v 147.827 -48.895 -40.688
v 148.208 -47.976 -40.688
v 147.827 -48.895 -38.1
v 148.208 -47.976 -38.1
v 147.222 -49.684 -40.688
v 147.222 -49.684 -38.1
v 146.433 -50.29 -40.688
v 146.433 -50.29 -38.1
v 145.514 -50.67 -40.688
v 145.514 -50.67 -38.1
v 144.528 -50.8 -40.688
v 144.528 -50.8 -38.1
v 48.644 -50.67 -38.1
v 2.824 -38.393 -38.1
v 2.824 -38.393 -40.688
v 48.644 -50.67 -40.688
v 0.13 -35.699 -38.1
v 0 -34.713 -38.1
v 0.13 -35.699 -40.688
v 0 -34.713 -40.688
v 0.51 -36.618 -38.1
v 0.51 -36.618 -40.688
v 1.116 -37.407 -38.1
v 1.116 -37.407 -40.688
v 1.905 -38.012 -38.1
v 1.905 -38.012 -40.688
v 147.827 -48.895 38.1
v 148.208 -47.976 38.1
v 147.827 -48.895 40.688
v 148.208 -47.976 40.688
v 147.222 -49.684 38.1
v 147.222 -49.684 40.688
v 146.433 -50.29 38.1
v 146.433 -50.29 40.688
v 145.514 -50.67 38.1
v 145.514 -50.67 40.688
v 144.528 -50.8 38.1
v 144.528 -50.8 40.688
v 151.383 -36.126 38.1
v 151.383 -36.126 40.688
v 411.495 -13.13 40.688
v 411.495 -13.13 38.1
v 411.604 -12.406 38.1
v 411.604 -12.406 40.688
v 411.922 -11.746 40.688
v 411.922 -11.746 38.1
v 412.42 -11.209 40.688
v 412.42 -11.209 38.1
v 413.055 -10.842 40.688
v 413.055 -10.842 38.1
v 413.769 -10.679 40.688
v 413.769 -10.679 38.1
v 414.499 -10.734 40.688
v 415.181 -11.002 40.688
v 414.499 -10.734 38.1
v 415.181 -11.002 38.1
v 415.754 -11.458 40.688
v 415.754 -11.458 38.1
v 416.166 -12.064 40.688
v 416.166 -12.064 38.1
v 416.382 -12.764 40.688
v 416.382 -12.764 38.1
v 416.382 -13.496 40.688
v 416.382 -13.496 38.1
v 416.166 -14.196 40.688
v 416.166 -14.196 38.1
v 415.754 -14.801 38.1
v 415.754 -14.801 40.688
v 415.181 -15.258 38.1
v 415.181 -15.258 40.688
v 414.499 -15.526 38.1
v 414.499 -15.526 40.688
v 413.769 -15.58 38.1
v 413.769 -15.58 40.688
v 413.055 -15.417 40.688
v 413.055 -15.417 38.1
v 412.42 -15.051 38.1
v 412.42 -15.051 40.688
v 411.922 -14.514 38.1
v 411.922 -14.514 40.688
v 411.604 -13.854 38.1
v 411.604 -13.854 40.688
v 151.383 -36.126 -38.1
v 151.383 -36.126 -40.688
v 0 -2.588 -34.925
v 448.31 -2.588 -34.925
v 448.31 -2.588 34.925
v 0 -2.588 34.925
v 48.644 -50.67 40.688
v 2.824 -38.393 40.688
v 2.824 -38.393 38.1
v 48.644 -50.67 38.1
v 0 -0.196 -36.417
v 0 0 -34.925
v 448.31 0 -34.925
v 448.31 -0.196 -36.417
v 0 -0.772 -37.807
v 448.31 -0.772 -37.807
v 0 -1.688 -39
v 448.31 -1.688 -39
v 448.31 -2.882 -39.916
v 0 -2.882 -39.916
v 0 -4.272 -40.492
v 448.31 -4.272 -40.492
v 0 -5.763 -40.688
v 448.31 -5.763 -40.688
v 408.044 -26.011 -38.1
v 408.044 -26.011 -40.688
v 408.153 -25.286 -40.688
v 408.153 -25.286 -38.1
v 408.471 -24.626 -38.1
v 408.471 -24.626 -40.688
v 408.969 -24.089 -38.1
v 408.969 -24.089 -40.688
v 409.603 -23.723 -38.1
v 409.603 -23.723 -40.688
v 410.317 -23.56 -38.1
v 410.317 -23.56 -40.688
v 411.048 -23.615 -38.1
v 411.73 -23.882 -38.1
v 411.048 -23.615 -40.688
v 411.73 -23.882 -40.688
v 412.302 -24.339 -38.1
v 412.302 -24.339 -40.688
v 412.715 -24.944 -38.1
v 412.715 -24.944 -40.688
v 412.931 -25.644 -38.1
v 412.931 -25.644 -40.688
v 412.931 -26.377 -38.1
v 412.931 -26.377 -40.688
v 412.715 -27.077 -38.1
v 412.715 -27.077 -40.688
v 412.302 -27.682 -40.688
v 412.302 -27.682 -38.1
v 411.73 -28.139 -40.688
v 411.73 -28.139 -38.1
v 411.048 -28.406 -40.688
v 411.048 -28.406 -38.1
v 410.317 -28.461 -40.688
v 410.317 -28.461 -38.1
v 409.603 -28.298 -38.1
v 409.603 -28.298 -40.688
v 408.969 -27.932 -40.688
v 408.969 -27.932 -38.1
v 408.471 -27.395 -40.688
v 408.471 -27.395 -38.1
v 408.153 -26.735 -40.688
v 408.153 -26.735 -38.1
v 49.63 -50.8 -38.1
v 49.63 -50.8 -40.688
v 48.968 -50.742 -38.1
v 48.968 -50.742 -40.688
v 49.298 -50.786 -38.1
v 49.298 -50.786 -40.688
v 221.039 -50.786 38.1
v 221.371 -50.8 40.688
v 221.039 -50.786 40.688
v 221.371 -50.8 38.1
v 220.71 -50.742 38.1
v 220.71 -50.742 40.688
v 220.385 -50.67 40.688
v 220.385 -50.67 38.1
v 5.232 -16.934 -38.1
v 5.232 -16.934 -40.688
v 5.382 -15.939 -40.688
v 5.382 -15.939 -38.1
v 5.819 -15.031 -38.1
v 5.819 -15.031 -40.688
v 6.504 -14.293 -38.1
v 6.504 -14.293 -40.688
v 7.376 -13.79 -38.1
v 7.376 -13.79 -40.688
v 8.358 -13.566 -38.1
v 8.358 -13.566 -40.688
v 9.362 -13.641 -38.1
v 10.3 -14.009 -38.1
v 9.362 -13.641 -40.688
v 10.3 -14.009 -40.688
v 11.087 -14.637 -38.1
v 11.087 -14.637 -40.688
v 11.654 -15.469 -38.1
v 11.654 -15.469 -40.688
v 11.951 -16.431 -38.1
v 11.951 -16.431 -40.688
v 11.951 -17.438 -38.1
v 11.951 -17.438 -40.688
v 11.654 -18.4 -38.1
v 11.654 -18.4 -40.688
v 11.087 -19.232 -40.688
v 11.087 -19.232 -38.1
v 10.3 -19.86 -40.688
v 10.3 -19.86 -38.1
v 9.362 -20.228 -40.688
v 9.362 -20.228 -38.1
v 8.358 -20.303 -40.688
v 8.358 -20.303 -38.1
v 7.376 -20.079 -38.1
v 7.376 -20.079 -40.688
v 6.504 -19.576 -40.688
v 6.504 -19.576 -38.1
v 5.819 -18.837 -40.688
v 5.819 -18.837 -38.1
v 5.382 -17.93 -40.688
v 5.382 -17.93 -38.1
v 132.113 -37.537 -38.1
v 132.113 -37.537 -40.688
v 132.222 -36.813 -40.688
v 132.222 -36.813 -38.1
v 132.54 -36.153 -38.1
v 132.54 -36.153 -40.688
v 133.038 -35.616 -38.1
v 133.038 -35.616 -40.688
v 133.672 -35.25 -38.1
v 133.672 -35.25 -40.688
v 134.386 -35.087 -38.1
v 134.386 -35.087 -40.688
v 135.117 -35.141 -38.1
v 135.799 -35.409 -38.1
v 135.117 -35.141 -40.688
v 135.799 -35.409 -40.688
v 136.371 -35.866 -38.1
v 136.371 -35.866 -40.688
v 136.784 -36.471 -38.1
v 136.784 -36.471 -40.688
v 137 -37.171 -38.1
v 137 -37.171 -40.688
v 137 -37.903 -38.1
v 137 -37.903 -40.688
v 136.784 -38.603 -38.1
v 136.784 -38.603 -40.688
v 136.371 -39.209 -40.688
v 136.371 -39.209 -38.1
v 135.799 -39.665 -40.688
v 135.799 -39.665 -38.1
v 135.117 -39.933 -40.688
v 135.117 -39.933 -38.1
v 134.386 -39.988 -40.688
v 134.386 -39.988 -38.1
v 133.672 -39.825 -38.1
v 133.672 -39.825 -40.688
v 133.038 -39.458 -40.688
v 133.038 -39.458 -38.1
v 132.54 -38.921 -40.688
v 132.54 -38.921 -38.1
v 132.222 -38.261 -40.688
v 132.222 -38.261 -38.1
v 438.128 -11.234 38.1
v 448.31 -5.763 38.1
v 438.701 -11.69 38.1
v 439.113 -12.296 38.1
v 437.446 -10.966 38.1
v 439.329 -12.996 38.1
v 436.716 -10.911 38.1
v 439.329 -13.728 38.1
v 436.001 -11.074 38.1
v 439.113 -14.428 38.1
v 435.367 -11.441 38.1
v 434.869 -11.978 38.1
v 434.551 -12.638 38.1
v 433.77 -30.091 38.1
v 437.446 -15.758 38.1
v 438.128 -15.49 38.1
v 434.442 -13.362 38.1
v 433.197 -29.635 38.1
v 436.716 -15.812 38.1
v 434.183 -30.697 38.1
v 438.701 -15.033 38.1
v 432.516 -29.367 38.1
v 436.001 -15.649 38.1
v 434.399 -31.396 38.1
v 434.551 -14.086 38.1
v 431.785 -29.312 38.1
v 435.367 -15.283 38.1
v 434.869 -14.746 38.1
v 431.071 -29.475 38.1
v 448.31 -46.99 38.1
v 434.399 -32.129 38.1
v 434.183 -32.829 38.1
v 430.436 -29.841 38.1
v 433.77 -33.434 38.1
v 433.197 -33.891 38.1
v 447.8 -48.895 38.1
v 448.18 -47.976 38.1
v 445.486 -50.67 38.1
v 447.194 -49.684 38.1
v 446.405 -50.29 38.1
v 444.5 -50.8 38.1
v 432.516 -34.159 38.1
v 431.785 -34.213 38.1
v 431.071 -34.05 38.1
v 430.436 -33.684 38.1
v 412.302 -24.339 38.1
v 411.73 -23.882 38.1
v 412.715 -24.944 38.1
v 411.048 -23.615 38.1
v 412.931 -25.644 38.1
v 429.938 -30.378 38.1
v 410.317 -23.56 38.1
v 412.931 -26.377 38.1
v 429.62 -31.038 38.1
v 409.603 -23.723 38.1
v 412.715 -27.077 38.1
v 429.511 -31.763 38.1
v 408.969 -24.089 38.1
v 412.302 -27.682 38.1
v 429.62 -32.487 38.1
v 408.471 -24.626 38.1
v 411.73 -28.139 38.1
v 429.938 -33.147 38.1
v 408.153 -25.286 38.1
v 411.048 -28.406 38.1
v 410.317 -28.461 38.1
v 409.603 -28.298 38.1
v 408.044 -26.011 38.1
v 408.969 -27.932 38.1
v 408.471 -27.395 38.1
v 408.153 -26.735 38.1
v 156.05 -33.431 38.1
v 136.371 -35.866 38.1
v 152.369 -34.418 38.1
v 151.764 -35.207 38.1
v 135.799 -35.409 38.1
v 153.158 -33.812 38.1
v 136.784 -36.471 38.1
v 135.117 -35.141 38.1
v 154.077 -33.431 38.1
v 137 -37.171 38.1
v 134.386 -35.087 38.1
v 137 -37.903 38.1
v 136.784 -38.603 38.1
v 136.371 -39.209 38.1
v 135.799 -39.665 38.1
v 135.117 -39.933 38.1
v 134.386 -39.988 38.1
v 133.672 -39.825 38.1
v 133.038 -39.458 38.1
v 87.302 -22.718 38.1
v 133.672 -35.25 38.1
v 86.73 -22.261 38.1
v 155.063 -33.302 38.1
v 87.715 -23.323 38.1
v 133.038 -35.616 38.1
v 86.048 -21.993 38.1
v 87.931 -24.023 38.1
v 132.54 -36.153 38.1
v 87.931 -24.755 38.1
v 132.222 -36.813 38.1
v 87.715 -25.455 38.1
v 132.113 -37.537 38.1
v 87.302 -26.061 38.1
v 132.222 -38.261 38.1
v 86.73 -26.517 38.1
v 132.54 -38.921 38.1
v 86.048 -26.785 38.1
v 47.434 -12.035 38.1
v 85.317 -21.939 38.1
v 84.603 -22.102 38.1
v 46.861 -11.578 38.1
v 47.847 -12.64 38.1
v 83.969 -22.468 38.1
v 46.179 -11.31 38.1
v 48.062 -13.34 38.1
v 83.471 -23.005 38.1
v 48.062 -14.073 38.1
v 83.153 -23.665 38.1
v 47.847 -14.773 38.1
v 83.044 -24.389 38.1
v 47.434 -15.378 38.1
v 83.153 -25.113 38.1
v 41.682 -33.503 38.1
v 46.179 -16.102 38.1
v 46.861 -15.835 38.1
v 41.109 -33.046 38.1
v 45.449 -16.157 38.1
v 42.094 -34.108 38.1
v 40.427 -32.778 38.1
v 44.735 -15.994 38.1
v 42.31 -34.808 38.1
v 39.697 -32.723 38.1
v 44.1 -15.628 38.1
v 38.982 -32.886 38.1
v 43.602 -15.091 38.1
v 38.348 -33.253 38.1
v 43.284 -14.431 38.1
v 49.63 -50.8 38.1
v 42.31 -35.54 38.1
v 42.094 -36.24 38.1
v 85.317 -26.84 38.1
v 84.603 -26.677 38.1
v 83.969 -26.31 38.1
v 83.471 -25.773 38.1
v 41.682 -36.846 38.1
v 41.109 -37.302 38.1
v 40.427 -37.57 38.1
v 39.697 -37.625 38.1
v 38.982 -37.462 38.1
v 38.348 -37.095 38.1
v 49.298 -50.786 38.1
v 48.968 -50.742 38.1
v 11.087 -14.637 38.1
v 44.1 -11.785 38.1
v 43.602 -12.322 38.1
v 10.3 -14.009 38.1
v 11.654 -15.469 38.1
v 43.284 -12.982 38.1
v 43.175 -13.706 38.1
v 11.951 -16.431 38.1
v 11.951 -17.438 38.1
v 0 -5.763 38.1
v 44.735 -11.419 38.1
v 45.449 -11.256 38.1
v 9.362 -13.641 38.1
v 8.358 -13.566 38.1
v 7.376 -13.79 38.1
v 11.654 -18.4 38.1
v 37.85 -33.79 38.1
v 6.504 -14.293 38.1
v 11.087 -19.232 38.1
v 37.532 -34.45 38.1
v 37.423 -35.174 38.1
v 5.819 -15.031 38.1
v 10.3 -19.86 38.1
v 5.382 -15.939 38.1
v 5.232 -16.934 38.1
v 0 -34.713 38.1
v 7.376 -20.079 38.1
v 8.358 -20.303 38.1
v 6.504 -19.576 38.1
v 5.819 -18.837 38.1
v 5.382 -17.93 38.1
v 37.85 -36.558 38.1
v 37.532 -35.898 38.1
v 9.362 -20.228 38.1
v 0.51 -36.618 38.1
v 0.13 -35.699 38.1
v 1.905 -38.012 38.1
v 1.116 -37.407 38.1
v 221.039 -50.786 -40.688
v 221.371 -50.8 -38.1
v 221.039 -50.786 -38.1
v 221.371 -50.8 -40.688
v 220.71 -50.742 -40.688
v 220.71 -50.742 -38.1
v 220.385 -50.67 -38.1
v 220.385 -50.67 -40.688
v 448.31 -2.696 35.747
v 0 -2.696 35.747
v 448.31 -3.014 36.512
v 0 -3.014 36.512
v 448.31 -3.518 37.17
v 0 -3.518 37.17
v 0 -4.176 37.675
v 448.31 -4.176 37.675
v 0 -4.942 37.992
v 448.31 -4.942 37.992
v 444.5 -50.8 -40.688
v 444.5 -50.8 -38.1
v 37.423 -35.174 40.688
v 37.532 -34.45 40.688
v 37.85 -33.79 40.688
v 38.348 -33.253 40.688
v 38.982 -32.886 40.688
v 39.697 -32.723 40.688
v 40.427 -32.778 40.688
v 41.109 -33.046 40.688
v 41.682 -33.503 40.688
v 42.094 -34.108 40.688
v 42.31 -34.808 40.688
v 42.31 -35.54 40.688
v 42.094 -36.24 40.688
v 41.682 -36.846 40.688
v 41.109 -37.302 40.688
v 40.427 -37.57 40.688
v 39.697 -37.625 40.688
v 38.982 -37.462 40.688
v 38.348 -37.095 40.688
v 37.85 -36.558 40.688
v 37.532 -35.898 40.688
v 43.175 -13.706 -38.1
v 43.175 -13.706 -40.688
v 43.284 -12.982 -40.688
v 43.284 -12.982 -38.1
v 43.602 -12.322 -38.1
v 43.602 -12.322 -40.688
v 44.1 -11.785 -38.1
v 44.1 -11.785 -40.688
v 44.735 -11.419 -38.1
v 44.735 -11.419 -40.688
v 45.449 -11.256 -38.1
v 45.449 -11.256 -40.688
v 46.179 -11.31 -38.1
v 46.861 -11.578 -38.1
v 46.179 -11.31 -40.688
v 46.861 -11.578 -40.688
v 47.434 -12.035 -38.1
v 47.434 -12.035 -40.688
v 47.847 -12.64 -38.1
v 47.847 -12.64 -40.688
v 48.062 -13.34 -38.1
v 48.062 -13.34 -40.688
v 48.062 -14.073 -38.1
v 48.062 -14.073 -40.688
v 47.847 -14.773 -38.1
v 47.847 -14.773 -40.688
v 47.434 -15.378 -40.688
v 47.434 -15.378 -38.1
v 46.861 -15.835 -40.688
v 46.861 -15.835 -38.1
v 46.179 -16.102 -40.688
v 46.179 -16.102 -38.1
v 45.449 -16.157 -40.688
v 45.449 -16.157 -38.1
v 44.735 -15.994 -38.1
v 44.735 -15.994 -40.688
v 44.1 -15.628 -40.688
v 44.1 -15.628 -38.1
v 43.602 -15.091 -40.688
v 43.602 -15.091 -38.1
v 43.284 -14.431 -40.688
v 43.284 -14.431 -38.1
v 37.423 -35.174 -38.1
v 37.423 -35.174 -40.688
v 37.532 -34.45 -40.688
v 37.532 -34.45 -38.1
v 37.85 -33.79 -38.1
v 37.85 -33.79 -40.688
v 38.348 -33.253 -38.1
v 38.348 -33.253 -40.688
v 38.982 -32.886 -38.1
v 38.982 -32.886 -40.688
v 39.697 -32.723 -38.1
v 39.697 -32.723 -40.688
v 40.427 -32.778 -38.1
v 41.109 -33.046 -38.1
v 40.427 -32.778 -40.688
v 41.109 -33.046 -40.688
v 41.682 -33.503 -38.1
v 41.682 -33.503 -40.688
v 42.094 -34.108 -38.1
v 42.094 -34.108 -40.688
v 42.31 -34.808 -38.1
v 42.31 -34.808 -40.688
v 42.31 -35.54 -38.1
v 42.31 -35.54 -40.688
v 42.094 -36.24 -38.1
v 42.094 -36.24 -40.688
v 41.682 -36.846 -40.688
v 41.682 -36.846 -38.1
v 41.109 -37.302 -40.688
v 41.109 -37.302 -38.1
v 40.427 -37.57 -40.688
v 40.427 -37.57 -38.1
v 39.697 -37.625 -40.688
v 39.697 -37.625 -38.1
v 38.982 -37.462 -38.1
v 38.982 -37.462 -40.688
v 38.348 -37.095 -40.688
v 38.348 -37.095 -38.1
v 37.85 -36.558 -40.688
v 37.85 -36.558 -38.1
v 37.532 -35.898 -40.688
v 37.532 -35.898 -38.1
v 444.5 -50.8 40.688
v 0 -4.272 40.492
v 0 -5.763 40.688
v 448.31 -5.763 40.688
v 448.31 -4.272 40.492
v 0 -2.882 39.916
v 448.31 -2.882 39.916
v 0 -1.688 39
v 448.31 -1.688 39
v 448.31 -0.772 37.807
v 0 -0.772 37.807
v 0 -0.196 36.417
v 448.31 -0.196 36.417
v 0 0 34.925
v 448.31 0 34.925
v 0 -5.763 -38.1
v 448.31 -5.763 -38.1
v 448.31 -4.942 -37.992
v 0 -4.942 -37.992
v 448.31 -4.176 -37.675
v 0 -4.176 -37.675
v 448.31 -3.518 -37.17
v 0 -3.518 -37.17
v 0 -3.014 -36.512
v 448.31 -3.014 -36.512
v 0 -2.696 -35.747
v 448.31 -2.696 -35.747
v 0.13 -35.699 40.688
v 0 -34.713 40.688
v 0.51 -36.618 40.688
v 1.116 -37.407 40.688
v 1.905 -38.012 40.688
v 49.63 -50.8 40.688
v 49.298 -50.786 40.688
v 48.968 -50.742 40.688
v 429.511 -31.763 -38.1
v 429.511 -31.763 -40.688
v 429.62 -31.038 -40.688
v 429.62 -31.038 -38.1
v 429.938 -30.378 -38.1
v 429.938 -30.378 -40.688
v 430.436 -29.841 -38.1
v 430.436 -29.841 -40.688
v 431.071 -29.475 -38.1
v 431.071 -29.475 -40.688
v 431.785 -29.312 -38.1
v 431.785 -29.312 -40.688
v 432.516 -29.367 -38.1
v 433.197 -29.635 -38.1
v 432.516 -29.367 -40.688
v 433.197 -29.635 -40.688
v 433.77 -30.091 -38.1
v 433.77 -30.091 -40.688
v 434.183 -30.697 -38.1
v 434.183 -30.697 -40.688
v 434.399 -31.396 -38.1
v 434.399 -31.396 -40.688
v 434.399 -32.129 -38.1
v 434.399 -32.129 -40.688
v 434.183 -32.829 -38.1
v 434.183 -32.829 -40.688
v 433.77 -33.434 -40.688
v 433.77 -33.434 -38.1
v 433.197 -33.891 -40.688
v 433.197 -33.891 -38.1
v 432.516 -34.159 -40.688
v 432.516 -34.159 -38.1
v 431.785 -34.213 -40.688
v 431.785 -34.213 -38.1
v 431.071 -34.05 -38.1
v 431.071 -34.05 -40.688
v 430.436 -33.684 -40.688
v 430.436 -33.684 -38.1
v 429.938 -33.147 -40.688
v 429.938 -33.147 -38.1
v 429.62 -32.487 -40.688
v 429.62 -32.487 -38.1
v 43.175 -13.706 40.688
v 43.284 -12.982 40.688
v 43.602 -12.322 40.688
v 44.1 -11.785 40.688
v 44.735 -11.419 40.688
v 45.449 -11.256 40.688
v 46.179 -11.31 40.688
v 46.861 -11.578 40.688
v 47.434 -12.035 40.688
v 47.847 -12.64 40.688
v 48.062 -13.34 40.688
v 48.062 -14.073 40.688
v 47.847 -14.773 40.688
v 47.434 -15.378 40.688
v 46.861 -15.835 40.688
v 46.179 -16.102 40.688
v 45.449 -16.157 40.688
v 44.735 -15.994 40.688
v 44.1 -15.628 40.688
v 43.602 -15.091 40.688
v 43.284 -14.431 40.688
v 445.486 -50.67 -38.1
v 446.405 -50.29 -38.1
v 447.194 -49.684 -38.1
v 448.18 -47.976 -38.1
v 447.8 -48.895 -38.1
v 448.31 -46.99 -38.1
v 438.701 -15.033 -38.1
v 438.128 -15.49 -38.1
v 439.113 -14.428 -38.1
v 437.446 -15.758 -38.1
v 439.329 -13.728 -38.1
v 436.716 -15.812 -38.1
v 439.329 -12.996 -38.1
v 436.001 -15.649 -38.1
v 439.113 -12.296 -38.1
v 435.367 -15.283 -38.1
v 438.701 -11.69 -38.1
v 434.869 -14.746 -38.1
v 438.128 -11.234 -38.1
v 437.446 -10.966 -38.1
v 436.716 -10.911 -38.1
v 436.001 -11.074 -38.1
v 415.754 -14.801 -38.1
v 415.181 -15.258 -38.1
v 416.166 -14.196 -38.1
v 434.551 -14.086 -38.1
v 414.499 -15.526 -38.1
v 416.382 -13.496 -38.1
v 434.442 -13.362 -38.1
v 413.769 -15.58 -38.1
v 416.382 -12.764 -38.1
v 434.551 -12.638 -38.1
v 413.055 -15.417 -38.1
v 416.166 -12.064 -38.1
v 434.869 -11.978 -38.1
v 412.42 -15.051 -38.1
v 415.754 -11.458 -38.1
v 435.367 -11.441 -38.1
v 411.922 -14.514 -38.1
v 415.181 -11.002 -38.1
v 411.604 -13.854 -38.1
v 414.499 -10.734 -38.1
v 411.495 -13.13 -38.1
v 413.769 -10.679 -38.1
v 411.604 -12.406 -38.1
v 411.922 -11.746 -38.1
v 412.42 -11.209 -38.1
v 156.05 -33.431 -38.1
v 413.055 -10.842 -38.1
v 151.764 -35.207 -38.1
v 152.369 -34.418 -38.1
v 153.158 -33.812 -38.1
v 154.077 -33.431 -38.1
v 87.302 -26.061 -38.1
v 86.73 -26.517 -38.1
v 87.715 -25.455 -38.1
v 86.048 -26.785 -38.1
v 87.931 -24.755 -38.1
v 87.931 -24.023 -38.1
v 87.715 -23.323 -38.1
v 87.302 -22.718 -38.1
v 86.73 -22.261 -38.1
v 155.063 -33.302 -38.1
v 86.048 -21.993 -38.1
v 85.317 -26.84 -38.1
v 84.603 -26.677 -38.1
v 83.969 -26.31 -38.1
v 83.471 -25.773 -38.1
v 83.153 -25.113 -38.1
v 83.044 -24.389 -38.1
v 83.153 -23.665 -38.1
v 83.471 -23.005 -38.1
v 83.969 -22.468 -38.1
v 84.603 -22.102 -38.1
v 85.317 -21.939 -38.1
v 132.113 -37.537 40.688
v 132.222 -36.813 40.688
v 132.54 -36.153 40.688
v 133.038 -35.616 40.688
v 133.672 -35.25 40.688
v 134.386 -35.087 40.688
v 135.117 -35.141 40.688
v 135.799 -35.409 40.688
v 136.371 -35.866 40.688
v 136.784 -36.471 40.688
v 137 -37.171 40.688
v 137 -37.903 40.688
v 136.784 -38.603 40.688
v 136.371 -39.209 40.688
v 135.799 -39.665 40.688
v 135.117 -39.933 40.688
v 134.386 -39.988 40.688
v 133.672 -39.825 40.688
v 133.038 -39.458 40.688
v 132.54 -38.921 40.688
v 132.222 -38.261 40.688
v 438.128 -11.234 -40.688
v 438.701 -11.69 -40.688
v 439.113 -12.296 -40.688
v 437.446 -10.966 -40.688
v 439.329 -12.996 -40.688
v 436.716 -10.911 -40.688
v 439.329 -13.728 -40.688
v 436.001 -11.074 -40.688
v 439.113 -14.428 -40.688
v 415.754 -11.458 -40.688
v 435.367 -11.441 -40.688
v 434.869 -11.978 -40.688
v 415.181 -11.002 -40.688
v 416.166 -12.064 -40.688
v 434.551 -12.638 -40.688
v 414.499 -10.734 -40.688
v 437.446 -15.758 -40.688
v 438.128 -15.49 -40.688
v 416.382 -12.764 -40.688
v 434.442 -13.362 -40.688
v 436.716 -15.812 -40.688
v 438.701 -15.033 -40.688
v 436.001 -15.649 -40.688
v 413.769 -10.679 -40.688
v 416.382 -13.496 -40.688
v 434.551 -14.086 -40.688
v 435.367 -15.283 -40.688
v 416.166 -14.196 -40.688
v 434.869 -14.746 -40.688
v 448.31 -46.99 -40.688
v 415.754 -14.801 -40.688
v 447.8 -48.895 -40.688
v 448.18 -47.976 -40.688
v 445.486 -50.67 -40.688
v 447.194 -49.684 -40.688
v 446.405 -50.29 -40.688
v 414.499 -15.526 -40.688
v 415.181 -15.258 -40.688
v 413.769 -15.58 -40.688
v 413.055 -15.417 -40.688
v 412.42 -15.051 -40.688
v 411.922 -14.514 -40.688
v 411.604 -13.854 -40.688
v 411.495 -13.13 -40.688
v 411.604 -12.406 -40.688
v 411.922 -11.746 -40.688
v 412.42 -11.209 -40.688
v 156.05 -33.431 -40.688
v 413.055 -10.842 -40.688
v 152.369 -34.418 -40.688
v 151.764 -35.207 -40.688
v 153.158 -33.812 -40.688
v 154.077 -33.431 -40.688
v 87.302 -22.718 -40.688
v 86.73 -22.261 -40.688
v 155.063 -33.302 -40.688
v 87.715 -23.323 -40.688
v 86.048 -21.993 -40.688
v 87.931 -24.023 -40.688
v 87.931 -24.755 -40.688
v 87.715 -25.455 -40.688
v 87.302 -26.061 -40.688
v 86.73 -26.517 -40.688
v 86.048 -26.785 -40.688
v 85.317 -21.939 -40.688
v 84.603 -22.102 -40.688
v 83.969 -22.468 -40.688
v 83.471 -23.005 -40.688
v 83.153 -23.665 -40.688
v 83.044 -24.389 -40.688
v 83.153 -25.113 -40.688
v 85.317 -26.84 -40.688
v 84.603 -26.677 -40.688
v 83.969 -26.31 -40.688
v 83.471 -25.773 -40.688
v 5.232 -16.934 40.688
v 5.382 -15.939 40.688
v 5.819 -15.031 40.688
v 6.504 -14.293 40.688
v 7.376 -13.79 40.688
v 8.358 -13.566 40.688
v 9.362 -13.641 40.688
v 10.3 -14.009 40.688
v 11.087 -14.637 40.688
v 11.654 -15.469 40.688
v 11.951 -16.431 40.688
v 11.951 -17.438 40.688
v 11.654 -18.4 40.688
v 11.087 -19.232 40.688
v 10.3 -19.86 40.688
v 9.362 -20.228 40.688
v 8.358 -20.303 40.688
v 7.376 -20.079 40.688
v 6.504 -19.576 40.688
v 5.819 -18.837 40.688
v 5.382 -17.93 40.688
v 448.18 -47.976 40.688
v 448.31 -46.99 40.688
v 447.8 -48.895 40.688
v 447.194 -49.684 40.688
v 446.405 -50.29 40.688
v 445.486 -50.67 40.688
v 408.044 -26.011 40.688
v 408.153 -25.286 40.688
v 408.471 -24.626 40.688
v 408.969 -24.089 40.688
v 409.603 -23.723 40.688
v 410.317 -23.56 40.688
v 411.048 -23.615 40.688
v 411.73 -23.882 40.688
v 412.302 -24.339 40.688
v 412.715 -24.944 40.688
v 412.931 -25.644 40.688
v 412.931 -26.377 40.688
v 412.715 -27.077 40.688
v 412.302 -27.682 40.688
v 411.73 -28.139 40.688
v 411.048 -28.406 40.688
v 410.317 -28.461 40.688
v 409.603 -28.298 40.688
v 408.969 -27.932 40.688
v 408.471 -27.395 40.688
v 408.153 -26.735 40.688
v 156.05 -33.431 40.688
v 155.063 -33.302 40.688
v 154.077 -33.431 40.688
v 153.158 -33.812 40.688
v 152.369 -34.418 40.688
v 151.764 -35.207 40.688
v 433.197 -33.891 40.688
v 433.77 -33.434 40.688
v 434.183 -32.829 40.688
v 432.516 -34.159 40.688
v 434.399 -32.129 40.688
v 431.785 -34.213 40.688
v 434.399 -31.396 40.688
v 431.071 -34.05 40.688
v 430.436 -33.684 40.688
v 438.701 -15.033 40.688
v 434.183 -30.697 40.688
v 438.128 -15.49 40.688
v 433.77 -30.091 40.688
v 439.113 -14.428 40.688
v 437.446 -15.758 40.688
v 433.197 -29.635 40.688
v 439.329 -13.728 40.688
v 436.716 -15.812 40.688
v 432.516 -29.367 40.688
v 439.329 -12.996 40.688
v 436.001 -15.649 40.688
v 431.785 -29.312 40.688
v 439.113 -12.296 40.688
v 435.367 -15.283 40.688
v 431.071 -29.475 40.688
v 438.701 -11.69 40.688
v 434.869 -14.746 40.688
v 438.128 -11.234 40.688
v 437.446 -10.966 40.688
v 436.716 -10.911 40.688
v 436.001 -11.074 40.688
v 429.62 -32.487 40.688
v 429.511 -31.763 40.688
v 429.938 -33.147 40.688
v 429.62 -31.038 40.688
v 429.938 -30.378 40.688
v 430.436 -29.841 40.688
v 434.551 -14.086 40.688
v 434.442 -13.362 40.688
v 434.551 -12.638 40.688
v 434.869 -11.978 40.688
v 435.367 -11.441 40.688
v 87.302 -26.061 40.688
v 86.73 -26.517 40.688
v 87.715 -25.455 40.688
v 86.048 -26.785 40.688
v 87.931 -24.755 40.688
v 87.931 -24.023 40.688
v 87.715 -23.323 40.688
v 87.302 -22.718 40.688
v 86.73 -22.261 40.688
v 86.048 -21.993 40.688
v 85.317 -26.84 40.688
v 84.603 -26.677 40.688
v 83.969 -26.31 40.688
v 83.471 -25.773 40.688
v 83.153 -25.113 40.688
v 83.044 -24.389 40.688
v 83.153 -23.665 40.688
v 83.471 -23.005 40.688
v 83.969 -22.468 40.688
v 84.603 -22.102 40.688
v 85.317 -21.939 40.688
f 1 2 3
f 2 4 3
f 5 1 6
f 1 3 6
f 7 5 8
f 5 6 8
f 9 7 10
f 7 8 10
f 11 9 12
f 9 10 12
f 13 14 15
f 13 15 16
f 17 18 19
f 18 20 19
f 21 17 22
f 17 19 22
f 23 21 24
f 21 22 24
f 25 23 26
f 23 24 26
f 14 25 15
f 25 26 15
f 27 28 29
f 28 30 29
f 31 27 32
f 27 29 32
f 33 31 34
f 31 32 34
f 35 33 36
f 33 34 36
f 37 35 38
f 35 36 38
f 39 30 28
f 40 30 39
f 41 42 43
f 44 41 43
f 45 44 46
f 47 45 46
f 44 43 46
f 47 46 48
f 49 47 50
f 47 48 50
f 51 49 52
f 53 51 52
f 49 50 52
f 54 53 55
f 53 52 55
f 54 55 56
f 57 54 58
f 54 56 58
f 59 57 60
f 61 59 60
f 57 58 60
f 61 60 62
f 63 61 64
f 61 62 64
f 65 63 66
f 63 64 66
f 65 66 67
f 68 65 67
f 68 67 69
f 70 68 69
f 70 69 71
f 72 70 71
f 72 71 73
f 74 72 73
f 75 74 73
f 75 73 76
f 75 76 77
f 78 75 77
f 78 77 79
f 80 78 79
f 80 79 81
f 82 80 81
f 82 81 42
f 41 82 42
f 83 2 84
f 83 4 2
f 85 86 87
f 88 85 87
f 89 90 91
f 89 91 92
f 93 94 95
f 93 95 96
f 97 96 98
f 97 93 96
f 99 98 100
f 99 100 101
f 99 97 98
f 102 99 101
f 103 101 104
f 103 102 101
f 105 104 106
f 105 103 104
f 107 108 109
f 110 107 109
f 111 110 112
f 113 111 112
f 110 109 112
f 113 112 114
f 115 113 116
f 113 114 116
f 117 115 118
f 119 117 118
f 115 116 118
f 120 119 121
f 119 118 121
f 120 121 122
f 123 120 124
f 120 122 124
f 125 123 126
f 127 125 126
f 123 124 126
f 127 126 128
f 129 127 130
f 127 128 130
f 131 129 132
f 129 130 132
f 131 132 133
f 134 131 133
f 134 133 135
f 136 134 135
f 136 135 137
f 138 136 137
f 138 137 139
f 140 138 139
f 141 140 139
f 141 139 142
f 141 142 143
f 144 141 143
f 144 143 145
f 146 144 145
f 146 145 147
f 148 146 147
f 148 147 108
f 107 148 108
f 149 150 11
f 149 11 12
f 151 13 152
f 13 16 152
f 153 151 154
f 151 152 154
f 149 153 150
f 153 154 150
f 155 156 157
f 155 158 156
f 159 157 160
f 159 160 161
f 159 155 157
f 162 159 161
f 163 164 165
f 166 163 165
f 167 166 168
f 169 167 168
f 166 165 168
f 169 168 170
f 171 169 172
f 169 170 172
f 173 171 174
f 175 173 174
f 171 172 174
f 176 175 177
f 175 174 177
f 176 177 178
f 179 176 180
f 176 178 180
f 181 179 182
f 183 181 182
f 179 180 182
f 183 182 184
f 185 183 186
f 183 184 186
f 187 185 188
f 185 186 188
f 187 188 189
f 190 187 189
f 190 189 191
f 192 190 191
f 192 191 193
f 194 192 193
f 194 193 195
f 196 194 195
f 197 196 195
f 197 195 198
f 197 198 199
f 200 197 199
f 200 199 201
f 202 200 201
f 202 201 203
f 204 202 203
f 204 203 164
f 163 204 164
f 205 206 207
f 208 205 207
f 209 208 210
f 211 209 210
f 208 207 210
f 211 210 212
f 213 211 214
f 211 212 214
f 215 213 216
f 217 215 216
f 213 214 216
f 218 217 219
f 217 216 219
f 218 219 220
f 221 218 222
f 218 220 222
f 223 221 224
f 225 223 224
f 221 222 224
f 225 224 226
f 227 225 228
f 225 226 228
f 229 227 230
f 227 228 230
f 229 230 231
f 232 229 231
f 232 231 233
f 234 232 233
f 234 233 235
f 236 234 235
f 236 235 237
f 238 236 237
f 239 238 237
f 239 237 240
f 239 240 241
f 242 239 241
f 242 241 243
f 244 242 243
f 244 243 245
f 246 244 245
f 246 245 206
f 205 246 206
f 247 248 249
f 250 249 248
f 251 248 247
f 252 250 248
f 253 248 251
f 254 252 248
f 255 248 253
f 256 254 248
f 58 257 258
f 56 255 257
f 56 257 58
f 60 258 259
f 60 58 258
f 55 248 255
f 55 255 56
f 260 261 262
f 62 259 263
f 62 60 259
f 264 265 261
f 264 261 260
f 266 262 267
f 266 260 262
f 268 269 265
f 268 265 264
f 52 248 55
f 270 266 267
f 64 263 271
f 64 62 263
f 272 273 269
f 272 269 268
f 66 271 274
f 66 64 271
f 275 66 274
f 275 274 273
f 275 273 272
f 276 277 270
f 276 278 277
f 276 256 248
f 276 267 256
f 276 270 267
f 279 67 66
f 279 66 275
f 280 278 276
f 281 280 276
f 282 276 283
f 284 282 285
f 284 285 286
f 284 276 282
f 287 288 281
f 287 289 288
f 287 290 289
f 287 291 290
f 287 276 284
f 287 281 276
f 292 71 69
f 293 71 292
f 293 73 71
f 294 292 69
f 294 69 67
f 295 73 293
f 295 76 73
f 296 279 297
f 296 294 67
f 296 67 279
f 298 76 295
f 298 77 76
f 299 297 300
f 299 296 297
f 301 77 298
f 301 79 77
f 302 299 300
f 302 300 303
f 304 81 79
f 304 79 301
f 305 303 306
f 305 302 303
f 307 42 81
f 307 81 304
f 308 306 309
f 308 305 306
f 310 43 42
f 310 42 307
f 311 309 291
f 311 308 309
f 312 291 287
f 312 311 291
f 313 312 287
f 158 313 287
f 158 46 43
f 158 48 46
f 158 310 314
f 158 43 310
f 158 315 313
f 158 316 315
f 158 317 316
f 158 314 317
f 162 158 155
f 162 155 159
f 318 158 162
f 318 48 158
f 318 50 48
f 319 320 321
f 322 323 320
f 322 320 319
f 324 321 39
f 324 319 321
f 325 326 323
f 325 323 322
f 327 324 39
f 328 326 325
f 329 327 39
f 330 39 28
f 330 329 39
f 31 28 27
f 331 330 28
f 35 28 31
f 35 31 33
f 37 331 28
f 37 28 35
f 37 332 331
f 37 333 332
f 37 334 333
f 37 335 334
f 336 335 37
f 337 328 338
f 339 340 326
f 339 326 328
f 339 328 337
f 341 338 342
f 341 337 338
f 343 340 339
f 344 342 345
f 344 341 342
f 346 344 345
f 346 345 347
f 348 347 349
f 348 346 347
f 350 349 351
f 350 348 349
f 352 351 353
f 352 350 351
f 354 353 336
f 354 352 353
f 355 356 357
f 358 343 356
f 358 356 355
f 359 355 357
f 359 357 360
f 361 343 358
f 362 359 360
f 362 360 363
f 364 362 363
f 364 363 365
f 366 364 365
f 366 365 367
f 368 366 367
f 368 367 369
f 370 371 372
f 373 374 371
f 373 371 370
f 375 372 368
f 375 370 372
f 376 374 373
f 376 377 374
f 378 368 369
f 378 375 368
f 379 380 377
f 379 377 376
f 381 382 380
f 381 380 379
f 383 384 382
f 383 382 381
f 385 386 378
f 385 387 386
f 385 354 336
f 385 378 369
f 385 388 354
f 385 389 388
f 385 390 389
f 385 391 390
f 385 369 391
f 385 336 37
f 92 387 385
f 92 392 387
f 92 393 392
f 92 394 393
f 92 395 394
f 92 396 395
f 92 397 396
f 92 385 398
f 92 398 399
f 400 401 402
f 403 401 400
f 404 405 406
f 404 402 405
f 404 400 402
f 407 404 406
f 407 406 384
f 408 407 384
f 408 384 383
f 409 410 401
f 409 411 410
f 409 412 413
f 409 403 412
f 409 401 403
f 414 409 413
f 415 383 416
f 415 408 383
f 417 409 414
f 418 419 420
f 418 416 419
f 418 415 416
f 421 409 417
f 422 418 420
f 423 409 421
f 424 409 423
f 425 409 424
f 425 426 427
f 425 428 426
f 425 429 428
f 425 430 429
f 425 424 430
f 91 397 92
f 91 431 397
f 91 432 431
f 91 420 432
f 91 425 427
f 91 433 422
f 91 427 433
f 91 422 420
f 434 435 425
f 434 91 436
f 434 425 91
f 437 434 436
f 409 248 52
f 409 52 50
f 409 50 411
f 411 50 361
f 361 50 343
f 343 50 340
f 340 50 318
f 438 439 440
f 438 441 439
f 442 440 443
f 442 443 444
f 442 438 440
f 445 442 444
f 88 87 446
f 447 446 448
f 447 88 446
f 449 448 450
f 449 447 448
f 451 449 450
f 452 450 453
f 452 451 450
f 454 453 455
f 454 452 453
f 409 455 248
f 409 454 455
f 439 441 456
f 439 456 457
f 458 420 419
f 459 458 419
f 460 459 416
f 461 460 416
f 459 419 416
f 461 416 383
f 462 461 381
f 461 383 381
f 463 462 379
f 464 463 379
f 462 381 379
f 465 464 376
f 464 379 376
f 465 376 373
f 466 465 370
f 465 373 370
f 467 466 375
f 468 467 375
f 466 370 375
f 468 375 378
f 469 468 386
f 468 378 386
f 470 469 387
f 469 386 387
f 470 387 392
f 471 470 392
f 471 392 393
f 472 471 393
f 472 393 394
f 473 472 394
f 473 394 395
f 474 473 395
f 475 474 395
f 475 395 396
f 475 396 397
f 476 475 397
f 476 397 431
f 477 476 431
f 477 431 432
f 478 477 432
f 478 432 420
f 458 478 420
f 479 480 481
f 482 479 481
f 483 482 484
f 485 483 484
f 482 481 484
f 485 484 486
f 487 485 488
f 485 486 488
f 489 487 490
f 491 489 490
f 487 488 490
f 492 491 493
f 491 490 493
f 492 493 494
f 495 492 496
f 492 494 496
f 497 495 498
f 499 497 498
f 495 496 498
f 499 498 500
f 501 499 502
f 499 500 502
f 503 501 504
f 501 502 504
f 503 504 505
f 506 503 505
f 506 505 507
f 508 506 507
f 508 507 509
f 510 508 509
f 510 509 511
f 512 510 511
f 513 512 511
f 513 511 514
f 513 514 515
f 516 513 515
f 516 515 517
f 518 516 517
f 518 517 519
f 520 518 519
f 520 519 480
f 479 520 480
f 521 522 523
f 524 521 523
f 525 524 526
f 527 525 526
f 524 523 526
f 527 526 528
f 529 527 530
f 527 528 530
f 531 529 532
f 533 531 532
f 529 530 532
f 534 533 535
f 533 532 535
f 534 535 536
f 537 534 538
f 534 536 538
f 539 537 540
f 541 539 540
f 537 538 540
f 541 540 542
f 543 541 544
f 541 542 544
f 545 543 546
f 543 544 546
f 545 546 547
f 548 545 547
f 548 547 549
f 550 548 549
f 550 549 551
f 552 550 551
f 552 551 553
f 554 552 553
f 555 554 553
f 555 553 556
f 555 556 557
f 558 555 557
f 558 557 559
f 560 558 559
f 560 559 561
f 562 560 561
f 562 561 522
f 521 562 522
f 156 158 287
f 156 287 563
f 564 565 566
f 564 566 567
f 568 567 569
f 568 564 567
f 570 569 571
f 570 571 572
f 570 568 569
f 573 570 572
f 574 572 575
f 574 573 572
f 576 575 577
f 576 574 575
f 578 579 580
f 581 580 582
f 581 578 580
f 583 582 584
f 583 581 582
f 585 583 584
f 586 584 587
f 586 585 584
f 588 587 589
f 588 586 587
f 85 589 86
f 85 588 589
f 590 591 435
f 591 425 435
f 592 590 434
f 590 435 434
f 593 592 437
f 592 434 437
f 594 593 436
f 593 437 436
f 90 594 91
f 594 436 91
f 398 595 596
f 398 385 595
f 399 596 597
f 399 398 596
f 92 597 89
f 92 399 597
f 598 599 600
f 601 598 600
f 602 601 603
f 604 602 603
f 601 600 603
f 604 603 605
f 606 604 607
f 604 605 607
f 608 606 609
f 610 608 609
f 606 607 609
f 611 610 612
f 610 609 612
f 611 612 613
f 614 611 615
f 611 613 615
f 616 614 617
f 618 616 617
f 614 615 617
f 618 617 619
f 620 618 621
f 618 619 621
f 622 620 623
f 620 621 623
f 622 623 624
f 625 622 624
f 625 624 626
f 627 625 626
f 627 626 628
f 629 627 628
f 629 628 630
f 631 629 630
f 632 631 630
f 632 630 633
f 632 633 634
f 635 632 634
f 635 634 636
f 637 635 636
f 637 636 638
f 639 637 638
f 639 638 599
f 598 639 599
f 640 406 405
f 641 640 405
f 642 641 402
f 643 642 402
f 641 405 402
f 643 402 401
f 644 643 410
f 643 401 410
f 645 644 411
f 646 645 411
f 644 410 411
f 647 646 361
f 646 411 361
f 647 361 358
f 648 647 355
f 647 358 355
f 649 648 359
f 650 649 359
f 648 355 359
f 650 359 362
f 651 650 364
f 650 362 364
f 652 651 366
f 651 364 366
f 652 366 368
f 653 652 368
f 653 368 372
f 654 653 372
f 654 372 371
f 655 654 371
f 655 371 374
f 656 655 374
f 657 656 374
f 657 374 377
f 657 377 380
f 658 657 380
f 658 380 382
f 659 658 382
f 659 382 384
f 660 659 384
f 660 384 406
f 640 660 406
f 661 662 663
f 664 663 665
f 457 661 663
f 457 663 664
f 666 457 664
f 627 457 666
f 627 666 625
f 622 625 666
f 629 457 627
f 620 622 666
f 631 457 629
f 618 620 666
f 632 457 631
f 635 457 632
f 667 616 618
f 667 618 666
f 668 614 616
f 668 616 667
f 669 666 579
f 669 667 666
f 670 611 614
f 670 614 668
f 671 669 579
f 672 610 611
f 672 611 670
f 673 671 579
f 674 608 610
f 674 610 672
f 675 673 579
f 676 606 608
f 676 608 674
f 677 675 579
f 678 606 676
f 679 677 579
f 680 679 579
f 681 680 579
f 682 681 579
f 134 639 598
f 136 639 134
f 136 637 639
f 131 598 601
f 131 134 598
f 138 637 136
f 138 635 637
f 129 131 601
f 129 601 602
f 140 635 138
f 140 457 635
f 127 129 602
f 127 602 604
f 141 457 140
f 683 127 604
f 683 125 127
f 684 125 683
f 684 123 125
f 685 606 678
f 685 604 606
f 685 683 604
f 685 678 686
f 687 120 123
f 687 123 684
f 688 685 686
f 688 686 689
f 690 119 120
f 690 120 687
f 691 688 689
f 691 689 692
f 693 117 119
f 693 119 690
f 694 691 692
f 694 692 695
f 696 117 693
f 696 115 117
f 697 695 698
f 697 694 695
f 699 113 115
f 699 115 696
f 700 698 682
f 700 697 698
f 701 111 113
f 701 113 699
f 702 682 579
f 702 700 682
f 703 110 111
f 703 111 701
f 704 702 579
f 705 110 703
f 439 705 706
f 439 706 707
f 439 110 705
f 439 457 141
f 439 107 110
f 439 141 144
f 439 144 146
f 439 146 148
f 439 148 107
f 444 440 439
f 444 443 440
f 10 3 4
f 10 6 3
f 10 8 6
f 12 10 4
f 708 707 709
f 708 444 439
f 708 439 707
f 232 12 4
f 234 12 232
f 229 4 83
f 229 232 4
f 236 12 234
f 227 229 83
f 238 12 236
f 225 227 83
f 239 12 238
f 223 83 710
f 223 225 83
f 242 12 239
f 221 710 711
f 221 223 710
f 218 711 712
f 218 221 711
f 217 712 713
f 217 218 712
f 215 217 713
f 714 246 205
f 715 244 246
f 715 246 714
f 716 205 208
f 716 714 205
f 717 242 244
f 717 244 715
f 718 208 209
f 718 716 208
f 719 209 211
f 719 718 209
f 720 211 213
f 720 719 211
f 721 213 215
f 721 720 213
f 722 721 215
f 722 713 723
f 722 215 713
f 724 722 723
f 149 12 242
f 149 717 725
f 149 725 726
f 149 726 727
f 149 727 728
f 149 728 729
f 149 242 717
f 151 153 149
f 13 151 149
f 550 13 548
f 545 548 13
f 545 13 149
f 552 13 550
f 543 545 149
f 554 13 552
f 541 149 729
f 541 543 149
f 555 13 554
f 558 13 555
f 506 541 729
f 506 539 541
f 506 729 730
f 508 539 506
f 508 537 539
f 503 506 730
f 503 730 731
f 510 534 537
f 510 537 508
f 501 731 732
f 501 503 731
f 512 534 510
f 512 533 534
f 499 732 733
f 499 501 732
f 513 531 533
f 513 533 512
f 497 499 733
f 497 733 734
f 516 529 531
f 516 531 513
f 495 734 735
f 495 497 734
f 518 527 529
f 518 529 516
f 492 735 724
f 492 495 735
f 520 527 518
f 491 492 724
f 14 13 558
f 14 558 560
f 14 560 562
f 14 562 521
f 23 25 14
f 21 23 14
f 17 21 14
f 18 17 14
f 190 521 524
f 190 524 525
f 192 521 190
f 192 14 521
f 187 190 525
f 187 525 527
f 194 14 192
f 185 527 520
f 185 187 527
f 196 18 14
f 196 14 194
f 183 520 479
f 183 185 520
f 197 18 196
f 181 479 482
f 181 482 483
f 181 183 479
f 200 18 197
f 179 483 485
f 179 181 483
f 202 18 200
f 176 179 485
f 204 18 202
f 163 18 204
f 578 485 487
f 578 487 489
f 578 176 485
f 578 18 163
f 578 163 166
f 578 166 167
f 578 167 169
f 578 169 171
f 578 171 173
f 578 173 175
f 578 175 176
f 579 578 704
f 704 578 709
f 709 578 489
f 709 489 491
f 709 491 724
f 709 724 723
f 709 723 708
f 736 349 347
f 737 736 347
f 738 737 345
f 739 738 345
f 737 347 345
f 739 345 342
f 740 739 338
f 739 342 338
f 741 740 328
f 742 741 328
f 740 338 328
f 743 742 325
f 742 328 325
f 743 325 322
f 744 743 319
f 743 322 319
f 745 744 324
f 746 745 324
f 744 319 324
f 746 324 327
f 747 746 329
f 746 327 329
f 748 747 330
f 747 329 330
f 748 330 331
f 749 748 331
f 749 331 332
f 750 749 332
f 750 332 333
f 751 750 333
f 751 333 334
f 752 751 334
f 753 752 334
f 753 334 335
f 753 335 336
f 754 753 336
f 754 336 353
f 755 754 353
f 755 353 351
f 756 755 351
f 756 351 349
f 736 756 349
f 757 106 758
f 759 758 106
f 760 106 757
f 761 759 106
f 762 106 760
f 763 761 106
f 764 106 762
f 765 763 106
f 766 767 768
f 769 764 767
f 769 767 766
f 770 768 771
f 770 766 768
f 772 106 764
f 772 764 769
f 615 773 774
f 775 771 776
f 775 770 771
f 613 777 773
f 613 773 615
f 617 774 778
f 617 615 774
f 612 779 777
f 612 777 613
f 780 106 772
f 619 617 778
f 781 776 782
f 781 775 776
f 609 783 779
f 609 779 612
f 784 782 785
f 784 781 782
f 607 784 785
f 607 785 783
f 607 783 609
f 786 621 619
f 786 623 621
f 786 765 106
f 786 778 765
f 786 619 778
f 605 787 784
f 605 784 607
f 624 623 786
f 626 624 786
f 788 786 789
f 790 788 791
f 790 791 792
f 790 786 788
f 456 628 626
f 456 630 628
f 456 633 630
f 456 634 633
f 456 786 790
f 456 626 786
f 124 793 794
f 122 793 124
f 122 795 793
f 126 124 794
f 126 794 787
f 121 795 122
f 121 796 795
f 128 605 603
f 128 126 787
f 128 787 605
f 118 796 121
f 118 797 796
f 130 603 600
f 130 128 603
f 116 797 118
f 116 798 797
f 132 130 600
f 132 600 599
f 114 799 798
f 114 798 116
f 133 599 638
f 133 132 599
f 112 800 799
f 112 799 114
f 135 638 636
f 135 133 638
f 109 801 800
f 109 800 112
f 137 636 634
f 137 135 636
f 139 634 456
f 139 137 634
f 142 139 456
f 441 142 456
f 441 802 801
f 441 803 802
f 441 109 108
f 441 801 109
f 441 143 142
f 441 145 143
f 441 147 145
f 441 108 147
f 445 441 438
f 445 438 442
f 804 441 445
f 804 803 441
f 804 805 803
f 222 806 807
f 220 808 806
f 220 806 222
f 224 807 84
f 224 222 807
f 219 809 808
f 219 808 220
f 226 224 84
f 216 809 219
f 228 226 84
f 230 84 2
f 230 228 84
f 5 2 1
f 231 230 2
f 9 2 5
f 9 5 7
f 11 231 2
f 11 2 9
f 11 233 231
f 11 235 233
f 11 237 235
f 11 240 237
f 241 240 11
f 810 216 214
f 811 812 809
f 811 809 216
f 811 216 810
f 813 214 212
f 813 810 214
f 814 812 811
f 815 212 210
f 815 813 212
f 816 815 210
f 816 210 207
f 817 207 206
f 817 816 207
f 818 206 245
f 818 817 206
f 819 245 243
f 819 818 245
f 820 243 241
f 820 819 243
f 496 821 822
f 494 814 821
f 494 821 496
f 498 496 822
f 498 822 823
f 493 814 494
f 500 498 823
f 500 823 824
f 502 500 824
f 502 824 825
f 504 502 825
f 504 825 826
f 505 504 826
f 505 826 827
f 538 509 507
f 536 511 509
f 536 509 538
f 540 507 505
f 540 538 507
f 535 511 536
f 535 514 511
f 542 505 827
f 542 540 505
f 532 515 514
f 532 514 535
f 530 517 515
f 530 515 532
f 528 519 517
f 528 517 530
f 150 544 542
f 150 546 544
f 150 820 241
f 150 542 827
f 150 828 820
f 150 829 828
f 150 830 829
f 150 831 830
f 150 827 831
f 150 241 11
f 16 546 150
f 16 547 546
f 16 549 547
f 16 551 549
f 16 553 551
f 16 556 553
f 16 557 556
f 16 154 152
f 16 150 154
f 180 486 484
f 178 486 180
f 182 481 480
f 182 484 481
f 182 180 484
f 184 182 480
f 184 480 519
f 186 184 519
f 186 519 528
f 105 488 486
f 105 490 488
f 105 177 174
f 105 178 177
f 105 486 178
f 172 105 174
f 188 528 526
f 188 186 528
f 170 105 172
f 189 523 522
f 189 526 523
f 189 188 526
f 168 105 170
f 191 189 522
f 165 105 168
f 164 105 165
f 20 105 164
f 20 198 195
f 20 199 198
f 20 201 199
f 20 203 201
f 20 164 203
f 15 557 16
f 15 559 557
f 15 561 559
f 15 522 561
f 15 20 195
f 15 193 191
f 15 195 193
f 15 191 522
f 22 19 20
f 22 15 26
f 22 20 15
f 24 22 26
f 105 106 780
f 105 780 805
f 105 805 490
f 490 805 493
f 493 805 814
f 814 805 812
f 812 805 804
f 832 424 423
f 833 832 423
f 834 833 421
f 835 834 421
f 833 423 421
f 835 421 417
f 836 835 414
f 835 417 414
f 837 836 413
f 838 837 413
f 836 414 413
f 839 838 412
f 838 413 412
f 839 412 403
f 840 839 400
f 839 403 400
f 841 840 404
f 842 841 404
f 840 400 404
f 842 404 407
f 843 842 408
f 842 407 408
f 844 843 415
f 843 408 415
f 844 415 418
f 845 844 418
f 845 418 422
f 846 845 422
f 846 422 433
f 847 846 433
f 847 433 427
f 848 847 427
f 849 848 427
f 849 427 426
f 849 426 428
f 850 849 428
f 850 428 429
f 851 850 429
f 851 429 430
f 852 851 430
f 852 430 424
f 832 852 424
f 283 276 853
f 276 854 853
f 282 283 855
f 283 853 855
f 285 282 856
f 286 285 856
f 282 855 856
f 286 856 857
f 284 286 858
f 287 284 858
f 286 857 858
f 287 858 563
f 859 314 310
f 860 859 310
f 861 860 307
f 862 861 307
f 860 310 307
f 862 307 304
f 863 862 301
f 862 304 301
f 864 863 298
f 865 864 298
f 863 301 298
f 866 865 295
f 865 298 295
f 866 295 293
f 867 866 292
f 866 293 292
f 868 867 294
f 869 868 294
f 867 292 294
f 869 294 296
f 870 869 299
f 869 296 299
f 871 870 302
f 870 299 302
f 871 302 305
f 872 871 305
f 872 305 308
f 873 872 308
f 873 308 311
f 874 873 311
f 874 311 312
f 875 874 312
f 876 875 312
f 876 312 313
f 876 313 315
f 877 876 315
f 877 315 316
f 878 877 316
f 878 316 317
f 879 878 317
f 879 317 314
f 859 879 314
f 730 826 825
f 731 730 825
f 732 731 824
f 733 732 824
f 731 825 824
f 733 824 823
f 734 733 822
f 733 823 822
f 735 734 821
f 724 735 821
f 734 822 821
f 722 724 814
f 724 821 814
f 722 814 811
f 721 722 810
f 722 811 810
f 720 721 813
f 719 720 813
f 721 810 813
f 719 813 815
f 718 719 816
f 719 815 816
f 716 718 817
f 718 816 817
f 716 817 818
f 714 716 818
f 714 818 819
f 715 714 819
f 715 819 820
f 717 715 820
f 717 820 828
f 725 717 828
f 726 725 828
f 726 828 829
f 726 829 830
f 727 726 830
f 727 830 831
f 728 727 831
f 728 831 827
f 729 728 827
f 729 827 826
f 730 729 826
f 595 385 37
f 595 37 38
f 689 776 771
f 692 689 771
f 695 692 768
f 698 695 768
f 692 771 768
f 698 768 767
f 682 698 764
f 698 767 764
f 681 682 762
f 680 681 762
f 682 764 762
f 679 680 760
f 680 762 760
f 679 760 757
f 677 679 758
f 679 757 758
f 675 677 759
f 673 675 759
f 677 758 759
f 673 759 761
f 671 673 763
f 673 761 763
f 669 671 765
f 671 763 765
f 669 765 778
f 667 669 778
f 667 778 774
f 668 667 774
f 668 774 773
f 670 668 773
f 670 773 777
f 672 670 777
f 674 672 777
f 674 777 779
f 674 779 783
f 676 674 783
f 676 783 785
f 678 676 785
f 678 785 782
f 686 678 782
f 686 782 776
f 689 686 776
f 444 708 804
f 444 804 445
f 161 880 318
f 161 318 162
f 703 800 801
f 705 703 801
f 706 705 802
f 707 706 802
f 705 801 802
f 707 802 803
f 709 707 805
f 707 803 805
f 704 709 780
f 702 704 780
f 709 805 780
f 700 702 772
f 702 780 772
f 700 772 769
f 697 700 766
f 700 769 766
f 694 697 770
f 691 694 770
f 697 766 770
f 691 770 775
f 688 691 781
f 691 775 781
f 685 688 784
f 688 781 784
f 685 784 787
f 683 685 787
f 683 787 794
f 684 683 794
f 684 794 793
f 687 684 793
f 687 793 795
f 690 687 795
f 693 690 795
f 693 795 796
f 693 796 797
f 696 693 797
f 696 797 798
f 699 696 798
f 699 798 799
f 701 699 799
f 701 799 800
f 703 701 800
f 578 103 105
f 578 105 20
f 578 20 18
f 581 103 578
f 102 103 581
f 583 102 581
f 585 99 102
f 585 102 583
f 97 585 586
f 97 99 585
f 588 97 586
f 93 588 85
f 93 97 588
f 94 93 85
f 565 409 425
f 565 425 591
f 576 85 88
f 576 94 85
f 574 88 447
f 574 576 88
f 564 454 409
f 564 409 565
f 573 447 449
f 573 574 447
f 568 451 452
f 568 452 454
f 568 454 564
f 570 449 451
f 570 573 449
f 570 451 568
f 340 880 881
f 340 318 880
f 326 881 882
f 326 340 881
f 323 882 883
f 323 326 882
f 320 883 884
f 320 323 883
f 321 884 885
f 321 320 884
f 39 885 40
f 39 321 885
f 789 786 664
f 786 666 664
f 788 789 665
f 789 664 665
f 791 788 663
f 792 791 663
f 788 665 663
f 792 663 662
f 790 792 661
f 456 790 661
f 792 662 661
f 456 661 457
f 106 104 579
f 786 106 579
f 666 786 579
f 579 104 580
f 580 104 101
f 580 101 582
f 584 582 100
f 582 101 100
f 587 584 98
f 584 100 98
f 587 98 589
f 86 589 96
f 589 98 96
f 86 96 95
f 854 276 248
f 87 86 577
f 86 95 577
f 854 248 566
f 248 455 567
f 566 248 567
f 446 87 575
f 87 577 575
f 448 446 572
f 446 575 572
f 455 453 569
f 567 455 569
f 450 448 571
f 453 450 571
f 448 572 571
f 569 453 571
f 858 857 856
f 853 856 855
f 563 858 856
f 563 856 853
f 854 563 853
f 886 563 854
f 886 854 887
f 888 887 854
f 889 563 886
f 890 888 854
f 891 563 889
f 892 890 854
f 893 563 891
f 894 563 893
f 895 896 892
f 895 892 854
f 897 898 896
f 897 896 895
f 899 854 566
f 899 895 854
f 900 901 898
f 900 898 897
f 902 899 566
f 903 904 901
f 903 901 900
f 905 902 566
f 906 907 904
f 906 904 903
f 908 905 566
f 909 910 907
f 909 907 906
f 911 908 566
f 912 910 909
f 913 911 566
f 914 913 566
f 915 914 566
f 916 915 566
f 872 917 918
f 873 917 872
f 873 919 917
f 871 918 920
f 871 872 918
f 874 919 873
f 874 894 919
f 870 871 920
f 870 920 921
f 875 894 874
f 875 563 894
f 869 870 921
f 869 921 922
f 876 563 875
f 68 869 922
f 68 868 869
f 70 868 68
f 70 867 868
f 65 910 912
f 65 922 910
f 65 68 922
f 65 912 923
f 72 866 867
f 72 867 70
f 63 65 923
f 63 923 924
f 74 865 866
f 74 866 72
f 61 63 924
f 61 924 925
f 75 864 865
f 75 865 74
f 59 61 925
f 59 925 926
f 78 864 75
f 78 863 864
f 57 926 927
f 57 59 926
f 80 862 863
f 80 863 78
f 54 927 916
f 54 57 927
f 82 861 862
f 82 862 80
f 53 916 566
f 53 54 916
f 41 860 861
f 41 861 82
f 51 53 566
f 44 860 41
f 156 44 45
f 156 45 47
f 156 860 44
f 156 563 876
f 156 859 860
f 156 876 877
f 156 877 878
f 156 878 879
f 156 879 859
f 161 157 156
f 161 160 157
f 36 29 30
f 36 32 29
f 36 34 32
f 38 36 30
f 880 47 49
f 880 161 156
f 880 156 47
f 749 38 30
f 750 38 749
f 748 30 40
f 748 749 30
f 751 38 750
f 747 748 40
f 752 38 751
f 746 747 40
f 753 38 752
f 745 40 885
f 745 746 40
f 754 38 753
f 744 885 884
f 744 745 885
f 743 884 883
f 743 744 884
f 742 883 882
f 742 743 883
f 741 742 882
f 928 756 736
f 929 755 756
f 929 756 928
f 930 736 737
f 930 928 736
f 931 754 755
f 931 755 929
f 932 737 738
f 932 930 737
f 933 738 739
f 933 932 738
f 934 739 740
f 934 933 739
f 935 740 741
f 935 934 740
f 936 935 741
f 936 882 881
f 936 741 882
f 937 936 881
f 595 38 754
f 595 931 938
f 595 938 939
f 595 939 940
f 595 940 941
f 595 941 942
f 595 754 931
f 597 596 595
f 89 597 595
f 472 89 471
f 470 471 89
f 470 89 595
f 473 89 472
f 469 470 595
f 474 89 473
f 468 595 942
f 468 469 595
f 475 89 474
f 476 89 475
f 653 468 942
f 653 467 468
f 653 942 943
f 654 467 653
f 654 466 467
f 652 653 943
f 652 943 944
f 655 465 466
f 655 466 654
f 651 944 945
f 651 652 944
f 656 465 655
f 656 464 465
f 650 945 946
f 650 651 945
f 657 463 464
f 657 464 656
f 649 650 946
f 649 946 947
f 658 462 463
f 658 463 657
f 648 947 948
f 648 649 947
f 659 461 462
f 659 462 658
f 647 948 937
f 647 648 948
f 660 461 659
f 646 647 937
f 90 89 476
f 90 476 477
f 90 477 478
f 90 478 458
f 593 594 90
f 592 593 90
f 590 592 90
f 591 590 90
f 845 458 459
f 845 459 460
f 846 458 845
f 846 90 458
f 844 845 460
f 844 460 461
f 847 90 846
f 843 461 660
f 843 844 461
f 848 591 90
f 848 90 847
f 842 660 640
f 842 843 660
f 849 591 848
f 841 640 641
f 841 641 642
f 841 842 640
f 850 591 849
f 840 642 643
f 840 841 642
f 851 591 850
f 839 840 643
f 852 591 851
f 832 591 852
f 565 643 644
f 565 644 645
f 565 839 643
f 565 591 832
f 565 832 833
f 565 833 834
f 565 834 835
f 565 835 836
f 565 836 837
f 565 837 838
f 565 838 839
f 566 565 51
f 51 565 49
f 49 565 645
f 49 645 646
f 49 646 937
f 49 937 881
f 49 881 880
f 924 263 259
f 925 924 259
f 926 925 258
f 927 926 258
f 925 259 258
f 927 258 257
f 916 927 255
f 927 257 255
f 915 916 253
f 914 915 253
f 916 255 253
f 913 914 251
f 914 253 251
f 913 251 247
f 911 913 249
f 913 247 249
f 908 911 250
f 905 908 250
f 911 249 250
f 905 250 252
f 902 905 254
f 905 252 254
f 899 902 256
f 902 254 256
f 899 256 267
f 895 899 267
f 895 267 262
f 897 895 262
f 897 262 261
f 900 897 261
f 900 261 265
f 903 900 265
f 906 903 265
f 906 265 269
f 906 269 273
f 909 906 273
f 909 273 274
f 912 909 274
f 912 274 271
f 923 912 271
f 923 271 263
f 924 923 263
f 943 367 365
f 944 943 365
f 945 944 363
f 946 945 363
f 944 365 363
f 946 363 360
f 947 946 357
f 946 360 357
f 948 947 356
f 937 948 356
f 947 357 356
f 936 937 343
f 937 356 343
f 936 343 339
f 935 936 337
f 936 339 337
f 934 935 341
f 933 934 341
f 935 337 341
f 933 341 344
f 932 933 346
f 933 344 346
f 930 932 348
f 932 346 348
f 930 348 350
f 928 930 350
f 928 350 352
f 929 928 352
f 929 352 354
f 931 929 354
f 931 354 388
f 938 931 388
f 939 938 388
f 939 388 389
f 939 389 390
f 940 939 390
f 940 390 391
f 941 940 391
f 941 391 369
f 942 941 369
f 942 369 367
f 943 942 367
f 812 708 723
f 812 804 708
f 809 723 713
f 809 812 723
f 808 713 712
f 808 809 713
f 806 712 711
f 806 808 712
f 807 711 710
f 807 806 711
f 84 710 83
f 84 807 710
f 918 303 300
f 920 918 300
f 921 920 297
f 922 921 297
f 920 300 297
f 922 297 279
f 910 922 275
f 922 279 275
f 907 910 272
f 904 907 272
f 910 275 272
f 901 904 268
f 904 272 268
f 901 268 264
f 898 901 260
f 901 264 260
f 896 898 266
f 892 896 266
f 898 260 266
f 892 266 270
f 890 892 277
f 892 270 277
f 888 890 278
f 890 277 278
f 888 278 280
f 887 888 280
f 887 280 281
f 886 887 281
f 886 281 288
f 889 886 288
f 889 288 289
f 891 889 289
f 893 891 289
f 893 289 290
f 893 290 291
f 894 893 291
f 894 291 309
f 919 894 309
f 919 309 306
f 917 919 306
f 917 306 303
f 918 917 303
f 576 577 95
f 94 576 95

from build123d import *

# Parameters (mm, degrees)
BASE_FLANGE1_DEPTH           = 448.31
CUT_EXTRUDE1_DEPTH           = 459.458977562
F_1_4_CLEARANCE_HOLE1_D      = 6.7564
F_10_0_1935_DIAMETER_HOLE1_D = 4.9149
CUT_EXTRUDE2_DEPTH           = 459.458977562
FILLET1_R                    = 3.81


# Sheet-metal steps are written as plain solids
with BuildPart() as part:
    # Sketch2 → Base-Flange1 (new body)
    with BuildSketch(Plane(origin=(0, 0, 0), x_dir=(0, 0, -1), z_dir=(1, 0, 0))):
        with BuildLine():
            Line((-40.68826, -50.8), (-40.68826, -5.76326))
            ThreePointArc((-40.68826, -5.76326), (-39.000240228, -1.688019772), (-34.925, 0))
            Line((-34.925, 0), (34.925, 0))
            ThreePointArc((34.925, 0), (39.000240228, -1.688019772), (40.68826, -5.76326))
            Line((40.68826, -5.76326), (40.68826, -50.8))
            Line((40.68826, -50.8), (38.1, -50.8))
            Line((38.1, -50.8), (38.1, -5.76326))
            ThreePointArc((38.1, -5.76326), (37.17006403, -3.51819597), (34.925, -2.58826))
            Line((34.925, -2.58826), (-34.925, -2.58826))
            ThreePointArc((-34.925, -2.58826), (-37.17006403, -3.51819597), (-38.1, -5.76326))
            Line((-38.1, -5.76326), (-38.1, -50.8))
            Line((-38.1, -50.8), (-40.68826, -50.8))
        make_face()
    extrude(amount=BASE_FLANGE1_DEPTH)

    # Sketch8 → Cut-Extrude1 (cut, through all)
    with BuildSketch(Plane.XY.offset(40.68826)):
        Polygon((0, -37.636171444), (49.128076995, -50.8), (0, -50.8), align=None)
    extrude(amount=-CUT_EXTRUDE1_DEPTH, mode=Mode.SUBTRACT)

    # 1/4 Clearance Hole1 (through all)
    with Locations(Plane.XY.offset(40.68826)):
        with Locations((8.61046841, -16.934326391)):
            Hole(F_1_4_CLEARANCE_HOLE1_D / 2)

    # #10 (0.1935) Diameter Hole1 (through all)
    with Locations(Plane.XY.offset(40.68826)):
        with Locations((410.50096824, -26.010505082), (413.952320207, -13.129884188), (436.899172539, -13.361871369), (431.968669729, -31.762758359), (39.880176489, -35.174025037), (45.632429766, -13.706323547), (85.501018246, -24.389079634), (134.570050222, -37.537087125)):
            Hole(F_10_0_1935_DIAMETER_HOLE1_D / 2)

    # Sketch9 → Cut-Extrude2 (cut, through all)
    with BuildSketch(Plane.XY.offset(40.68826)):
        Polygon((140.864867564, -75.380798949), (152.369374119, -32.445395971), (220.869688909, -50.8), (209.365182354, -93.735402979), align=None)
    extrude(amount=-CUT_EXTRUDE2_DEPTH, mode=Mode.SUBTRACT)

    # Fillet1
    fillet1_edges = [part.edges().sort_by_distance(p)[0] for p in [
        (147.451272792, -50.8, -39.39413),
        (147.451272792, -50.8, 39.39413),
        (152.369374119, -32.445395971, -39.39413),
        (152.369374119, -32.445395971, 39.39413),
        (220.869688909, -50.8, -39.39413),
        (220.869688909, -50.8, 39.39413),
        (448.31, -50.8, 39.39413),
        (49.128076995, -50.8, -39.39413),
        (0, -37.636171444, -39.39413),
        (0, -37.636171444, 39.39413),
        (49.128076995, -50.8, 39.39413),
        (448.31, -50.8, -39.39413),
    ]]
    fillet(fillet1_edges, radius=FILLET1_R)


solid = part.part
